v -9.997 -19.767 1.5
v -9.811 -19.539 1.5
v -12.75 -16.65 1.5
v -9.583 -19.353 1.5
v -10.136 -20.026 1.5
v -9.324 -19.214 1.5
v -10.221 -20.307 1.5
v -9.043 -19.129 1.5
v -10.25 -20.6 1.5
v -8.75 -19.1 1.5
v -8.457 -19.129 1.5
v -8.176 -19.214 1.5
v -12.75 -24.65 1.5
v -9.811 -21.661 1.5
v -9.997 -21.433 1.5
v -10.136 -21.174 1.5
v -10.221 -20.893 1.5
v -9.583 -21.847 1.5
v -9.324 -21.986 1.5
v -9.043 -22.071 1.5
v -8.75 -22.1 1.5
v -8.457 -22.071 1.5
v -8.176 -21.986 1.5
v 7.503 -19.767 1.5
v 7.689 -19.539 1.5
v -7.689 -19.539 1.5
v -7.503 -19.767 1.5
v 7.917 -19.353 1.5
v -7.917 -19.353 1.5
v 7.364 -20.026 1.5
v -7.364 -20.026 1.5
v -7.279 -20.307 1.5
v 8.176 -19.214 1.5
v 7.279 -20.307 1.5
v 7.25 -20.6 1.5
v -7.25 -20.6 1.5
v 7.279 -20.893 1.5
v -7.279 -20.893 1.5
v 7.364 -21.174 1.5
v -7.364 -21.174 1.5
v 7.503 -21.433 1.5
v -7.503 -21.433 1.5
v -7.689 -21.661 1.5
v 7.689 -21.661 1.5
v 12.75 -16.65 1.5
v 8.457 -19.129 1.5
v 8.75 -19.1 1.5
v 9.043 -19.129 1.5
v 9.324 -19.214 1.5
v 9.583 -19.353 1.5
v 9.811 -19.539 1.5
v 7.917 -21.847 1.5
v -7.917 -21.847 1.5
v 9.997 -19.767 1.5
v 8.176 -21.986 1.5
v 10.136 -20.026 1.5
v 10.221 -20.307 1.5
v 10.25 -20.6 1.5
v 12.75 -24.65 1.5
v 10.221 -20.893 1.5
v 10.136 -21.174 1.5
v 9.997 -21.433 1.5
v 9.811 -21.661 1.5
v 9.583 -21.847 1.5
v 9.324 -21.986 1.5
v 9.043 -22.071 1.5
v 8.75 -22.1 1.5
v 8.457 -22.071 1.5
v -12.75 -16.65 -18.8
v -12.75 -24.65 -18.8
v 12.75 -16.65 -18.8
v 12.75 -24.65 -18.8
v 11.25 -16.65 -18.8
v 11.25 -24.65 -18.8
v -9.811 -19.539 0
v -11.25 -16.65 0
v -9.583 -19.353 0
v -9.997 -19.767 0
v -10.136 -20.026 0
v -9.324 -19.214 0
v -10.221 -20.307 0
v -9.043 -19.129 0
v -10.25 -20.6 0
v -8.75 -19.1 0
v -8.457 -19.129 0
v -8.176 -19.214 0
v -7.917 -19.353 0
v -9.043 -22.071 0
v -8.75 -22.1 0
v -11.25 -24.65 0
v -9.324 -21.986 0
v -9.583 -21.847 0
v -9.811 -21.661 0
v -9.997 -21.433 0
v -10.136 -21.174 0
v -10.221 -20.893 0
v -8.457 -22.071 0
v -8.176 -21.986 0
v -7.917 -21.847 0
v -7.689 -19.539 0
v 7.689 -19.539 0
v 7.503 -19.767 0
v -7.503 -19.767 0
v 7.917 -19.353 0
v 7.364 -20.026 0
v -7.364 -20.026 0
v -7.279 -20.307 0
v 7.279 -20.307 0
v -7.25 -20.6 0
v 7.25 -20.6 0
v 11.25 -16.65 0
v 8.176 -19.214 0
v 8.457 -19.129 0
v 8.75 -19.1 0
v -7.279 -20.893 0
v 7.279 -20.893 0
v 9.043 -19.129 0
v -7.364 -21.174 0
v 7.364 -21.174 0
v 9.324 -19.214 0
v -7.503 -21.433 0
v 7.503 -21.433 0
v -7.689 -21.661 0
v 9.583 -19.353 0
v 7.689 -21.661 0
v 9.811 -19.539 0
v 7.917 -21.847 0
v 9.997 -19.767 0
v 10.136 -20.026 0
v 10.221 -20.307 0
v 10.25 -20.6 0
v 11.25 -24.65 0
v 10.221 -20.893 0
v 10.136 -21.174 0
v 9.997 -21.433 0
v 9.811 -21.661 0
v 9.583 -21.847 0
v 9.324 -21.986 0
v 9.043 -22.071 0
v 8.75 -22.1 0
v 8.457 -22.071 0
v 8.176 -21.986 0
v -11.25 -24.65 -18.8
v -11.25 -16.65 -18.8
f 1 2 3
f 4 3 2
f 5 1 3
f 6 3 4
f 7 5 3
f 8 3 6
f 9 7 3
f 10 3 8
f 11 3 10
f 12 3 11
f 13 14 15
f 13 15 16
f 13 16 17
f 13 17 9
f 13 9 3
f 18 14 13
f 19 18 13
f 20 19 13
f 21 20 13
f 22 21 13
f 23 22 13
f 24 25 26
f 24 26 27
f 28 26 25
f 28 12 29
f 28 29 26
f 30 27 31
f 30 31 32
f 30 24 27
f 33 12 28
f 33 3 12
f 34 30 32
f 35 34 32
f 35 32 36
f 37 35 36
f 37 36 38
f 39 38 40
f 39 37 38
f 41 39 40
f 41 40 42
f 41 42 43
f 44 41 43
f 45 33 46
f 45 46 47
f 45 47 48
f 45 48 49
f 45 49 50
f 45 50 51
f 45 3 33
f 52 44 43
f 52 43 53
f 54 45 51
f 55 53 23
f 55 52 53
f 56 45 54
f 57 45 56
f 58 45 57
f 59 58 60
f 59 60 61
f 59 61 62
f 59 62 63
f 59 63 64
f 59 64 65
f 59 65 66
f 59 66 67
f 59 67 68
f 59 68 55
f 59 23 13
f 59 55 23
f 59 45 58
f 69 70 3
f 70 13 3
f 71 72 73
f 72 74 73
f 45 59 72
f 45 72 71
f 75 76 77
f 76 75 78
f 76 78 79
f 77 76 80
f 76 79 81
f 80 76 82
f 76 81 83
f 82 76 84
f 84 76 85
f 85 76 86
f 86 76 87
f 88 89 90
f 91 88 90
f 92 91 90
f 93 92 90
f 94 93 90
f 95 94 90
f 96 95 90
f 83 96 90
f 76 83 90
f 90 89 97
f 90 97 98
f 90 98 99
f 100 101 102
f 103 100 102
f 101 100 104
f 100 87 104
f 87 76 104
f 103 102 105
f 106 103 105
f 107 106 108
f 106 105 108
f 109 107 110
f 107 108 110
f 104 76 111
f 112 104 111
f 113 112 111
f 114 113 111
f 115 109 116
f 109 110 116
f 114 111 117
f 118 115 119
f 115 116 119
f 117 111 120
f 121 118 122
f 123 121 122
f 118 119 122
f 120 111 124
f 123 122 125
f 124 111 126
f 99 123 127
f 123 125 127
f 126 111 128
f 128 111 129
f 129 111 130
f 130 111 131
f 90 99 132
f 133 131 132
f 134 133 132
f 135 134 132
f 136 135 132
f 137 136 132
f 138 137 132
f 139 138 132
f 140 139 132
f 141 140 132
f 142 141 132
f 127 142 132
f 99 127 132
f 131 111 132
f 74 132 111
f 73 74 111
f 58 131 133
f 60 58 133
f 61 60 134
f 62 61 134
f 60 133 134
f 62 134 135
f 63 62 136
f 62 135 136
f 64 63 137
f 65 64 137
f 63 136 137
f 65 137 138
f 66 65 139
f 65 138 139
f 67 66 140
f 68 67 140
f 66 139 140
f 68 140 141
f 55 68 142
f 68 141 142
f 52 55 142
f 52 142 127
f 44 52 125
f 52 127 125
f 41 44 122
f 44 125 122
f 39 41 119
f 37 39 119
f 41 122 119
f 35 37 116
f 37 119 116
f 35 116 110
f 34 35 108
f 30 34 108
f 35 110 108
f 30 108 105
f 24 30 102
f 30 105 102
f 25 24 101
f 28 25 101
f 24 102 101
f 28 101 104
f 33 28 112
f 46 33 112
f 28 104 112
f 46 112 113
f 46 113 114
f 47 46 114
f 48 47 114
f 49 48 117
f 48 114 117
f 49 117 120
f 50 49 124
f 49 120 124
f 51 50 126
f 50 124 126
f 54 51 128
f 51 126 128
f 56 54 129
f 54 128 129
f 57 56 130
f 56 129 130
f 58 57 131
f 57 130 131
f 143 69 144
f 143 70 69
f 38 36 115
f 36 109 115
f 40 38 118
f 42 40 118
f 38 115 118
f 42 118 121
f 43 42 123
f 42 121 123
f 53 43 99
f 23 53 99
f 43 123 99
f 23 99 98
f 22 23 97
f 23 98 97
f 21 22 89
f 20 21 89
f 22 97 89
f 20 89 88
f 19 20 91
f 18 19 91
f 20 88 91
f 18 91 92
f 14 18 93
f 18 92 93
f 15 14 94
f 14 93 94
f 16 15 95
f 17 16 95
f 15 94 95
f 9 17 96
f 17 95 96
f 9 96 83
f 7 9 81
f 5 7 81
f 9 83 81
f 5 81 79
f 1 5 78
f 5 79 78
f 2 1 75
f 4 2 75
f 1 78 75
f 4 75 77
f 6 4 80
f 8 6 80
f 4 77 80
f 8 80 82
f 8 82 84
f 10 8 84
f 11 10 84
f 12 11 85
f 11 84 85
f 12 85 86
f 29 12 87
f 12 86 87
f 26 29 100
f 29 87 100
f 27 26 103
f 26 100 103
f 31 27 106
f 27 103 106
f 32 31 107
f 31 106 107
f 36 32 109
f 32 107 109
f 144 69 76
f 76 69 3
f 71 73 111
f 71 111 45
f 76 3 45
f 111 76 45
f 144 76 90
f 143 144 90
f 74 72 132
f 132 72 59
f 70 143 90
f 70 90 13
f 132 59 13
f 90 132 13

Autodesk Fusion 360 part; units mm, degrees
sketch "Boceto5" plane through (-11.25, 0, 0) normal (-1, 0, 0) x (0, -1, 0)
sketch "Boceto8" plane through (12.75, 0, 0) normal (1, 0, 0) x (0, 1, 0)
  line L0 (-15.65, 0) -> (-25.65, 0)
  line L1 (-25.65, 0) -> (-25.65, -18.8)
  line L2 (-25.65, -18.8) -> (-15.65, -18.8)
  line L3 (-15.65, -18.8) -> (-15.65, 0)
  line L4 (-25.65, 0) -> (-25.65, 1.5)
  line L5 (-25.65, 1.5) -> (-15.65, 1.5)
  line L6 (-15.65, 1.5) -> (-15.65, 0)
  dimension "d15" = 1.5
sketch "Boceto10" plane through (0, -25.65, 0) normal (0, -1, 0) x (1, 0, 0)
  line L0 (12.75, 0) -> (12.75, 1.5)
  line L1 (12.75, 1.5) -> (-12.75, 1.5)
  line L2 (-12.75, 1.5) -> (-12.75, 0)
  line L3 (-12.75, 0) -> (12.75, 0)
  line L4 (-12.75, 0) -> (-12.75, 1.5)
  line L5 (12.75, 1.5) -> (-12.75, 1.5)
  line L6 (12.75, 1.5) -> (12.75, 0)
  line L7 (11.25, -18.8) -> (12.75, 0)
  line L8 (11.25, -18.8) -> (12.75, 0)
  line L9 (-12.75, 0) -> (12.75, 0)
  line L10 (-11.25, -18.8) -> (-12.75, 0)
  line L11 (-11.25, -18.8) -> (-12.75, 0)
sketch "Boceto11" plane through (11.25, 0, 0) normal (1, 0, 0) x (0, 1, 0)
  line L0 (-25.65, -10.05) -> (-25.65, -18.8)
  line L1 (-25.65, -18.8) -> (7.2, -18.8)
  line L2 (7.2, -18.8) -> (7.2, 0)
  line L3 (7.2, 0) -> (-25.65, 0)
  line L4 (-25.65, 0) -> (-25.65, -10.05)
  line L5 (-24.65, 0) -> (-16.65, 0)
  line L6 (-24.65, 0) -> (-24.65, -18.8)
  line L7 (-16.65, 0) -> (-16.65, -18.8)
  dimension "d22" = 1
  dimension "d23" = 8
extrude "Extruir7" add sketch "Boceto11" along normal blind 1.5 contours L1 L3 L5 L6 L7
sketch "Boceto12" plane through (12.75, 0, 0) normal (1, 0, 0) x (0, 1, 0)
  line L0 (-24.65, 0) -> (-24.65, -18.8)
  line L1 (-24.65, -18.8) -> (-16.65, -18.8)
  line L2 (-16.65, -18.8) -> (-16.65, 0)
  line L3 (-16.65, 0) -> (-24.65, 0)
  line L4 (-24.65, 0) -> (-24.65, 1.5)
  line L5 (-16.65, 0) -> (-16.65, 1.5)
  line L6 (-16.65, 1.5) -> (-24.65, 1.5)
  dimension "d26" = 1.5
  dimension "d27" = 1.5
extrude "Extruir8" add sketch "Boceto12" against normal blind 25.5 contours L3 L4 L5 L6
sketch "Boceto13" plane through (0, 0, 0) normal (0, 0, -1) x (1, 0, 0)
  line L0 (11.25, 16.65) -> (11.25, 24.65)
  line L1 (11.25, 24.65) -> (-12.75, 24.65)
  line L2 (-12.75, 24.65) -> (-12.75, 16.65)
  line L3 (-12.75, 16.65) -> (11.25, 16.65)
  line L4 (-12.75, 24.65) -> (-11.25, 24.65)
  line L5 (-12.75, 24.65) -> (-12.75, 16.65)
  line L6 (-12.75, 16.65) -> (-11.25, 16.65)
  line L7 (-11.25, 16.65) -> (-11.25, 24.65)
  dimension "d30" = 1.5
  dimension "d31" = 1.5
extrude "Extruir9" add sketch "Boceto13" along normal blind 18.8 contours L1 L2 L3 L4 L5 L6 L7
sketch "Boceto14" plane through (0, 0, -18.8) normal (0, 0, -1) x (1, 0, 0)
  line L0 (-7.25, -11.2) -> (7.25, -11.2)
  arc A0 (7.25, -11.2) -> (11.25, -7.2) centre (7.25, -7.2) ccw
  line L1 (11.25, -7.2) -> (11.25, 25.65)
  line L2 (11.25, 25.65) -> (7.0711, 25.65)
  line L3 (7.0711, 25.65) -> (7.0711, 37.15)
  line L4 (7.0711, 37.15) -> (-7.0711, 37.15)
  line L5 (-7.0711, 37.15) -> (-7.0711, 25.65)
  line L6 (-7.0711, 25.65) -> (-11.25, 25.65)
  line L7 (-11.25, 25.65) -> (-11.25, -7.2)
  arc A1 (-11.25, -7.2) -> (-7.25, -11.2) centre (-7.25, -7.2) ccw
  circle A2 centre (8.75, 20.6) radius 1.5
  circle A3 centre (-8.75, 20.6) radius 1.5
  circle A4 centre (0, 0) radius 2.7
  line L8 (-2.5, 31.15) -> (-2.5, 32.8199)
  line L9 (-2.5, 32.8199) -> (2.5, 32.8199)
  line L10 (2.5, 32.8199) -> (2.5, 31.15)
  line L11 (2.5, 31.15) -> (-2.5, 31.15)
  circle A5 centre (8.75, 20.6) radius 1.5
extrude "Extruir10" cut sketch "Boceto14" against normal blind 25 contours A2 A5 | A3
